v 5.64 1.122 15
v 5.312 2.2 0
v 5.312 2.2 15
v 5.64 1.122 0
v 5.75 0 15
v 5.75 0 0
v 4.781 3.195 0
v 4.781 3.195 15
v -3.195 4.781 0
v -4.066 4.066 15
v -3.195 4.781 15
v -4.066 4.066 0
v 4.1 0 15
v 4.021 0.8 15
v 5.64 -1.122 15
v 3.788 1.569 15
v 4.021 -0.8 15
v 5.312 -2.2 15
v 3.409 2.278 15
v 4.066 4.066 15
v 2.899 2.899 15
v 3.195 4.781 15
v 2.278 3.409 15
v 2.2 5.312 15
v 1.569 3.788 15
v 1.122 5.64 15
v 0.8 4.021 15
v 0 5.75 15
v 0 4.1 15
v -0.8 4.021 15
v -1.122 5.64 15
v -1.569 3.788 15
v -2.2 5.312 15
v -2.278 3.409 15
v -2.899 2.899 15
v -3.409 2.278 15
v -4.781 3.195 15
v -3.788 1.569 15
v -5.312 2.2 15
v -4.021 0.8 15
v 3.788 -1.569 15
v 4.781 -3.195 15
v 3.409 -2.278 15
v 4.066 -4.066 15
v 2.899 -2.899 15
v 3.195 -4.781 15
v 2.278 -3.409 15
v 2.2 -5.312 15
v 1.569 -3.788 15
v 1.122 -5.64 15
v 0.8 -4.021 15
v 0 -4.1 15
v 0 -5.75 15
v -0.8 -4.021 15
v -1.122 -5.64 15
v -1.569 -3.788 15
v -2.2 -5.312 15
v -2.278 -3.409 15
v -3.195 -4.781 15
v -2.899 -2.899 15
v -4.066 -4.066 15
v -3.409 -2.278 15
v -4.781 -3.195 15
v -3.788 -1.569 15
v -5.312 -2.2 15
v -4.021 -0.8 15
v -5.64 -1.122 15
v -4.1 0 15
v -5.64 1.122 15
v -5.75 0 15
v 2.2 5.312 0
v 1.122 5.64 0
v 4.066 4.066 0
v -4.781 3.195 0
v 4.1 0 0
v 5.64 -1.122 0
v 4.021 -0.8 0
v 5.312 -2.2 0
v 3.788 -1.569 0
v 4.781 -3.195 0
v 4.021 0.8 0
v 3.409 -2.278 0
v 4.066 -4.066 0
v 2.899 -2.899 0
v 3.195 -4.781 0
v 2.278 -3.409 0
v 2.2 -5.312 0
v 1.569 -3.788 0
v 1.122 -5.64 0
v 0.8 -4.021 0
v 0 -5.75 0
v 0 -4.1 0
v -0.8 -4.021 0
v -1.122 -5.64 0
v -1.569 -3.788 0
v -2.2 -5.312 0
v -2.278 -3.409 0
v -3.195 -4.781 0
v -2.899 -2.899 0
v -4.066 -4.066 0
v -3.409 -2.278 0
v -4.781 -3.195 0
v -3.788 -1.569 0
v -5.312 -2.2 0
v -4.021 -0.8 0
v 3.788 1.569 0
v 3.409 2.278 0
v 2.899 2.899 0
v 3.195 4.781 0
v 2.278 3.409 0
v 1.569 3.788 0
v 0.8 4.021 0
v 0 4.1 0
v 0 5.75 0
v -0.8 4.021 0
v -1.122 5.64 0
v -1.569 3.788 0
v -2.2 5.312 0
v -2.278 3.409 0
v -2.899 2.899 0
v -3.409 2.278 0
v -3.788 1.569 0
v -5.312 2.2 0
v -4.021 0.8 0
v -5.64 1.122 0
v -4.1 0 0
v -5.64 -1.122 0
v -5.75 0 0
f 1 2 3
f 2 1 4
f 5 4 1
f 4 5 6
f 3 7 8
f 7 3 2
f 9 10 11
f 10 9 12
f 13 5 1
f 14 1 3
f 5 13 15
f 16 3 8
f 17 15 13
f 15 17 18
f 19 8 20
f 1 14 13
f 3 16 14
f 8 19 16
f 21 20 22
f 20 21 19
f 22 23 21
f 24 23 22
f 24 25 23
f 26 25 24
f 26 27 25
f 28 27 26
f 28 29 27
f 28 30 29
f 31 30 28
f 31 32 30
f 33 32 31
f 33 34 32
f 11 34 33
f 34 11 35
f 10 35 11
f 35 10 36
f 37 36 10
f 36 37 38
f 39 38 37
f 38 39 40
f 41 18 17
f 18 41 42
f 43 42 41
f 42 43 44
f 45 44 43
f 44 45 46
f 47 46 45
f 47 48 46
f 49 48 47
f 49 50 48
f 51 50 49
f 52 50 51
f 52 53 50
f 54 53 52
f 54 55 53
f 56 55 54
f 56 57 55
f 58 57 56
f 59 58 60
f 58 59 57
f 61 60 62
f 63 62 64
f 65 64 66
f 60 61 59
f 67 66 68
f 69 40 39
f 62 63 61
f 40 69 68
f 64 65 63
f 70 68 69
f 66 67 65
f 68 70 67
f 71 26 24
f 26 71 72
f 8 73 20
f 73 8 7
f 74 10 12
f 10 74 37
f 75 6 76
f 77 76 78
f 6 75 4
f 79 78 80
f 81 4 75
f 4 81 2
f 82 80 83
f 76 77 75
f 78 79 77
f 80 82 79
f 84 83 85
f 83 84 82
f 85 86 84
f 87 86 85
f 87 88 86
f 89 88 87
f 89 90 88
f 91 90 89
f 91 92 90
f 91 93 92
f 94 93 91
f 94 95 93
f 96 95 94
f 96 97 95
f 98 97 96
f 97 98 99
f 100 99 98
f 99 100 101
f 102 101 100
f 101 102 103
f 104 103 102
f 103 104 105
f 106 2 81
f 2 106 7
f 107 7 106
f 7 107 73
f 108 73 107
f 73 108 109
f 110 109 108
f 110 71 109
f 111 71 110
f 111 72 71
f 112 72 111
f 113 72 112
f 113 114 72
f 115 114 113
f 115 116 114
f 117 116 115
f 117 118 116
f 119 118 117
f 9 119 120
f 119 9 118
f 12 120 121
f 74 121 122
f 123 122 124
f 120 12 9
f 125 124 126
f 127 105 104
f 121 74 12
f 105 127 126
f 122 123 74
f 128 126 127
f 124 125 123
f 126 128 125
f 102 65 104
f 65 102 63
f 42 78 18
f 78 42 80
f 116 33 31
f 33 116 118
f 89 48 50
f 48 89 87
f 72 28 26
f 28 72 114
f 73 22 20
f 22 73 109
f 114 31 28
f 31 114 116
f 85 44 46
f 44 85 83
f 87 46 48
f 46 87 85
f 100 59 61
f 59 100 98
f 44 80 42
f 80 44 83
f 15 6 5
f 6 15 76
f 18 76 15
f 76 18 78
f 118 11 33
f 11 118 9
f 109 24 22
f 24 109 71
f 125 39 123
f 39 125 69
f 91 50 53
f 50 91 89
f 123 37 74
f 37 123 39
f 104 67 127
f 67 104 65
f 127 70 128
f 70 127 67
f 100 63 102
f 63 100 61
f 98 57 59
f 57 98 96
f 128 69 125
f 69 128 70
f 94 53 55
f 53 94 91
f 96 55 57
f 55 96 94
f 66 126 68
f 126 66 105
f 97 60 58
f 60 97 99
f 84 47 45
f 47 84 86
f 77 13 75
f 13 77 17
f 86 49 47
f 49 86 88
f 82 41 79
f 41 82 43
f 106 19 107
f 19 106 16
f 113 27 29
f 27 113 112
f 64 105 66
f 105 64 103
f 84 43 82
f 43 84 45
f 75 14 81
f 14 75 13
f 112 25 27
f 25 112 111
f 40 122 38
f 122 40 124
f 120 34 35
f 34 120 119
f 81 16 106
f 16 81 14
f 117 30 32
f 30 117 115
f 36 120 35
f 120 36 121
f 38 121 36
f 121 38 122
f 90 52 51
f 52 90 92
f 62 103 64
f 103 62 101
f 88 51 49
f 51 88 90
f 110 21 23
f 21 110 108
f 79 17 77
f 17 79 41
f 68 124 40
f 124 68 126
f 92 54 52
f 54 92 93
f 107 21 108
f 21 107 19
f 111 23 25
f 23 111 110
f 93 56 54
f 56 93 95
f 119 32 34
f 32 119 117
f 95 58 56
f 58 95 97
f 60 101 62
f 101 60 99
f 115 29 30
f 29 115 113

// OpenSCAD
// Insert between two bearings in the vertical spool holder to provide spacing.

height = 15;
or = 11.5/2;
ir = (8.0 + 0.2)/2;

$fn = 32;

delta = 0.1;

module bearing_spacer() {
	difference() {
		cylinder(r = or, h = height);
		cylinder(r = ir, h = height + 2 * delta);
	}
}

bearing_spacer();
